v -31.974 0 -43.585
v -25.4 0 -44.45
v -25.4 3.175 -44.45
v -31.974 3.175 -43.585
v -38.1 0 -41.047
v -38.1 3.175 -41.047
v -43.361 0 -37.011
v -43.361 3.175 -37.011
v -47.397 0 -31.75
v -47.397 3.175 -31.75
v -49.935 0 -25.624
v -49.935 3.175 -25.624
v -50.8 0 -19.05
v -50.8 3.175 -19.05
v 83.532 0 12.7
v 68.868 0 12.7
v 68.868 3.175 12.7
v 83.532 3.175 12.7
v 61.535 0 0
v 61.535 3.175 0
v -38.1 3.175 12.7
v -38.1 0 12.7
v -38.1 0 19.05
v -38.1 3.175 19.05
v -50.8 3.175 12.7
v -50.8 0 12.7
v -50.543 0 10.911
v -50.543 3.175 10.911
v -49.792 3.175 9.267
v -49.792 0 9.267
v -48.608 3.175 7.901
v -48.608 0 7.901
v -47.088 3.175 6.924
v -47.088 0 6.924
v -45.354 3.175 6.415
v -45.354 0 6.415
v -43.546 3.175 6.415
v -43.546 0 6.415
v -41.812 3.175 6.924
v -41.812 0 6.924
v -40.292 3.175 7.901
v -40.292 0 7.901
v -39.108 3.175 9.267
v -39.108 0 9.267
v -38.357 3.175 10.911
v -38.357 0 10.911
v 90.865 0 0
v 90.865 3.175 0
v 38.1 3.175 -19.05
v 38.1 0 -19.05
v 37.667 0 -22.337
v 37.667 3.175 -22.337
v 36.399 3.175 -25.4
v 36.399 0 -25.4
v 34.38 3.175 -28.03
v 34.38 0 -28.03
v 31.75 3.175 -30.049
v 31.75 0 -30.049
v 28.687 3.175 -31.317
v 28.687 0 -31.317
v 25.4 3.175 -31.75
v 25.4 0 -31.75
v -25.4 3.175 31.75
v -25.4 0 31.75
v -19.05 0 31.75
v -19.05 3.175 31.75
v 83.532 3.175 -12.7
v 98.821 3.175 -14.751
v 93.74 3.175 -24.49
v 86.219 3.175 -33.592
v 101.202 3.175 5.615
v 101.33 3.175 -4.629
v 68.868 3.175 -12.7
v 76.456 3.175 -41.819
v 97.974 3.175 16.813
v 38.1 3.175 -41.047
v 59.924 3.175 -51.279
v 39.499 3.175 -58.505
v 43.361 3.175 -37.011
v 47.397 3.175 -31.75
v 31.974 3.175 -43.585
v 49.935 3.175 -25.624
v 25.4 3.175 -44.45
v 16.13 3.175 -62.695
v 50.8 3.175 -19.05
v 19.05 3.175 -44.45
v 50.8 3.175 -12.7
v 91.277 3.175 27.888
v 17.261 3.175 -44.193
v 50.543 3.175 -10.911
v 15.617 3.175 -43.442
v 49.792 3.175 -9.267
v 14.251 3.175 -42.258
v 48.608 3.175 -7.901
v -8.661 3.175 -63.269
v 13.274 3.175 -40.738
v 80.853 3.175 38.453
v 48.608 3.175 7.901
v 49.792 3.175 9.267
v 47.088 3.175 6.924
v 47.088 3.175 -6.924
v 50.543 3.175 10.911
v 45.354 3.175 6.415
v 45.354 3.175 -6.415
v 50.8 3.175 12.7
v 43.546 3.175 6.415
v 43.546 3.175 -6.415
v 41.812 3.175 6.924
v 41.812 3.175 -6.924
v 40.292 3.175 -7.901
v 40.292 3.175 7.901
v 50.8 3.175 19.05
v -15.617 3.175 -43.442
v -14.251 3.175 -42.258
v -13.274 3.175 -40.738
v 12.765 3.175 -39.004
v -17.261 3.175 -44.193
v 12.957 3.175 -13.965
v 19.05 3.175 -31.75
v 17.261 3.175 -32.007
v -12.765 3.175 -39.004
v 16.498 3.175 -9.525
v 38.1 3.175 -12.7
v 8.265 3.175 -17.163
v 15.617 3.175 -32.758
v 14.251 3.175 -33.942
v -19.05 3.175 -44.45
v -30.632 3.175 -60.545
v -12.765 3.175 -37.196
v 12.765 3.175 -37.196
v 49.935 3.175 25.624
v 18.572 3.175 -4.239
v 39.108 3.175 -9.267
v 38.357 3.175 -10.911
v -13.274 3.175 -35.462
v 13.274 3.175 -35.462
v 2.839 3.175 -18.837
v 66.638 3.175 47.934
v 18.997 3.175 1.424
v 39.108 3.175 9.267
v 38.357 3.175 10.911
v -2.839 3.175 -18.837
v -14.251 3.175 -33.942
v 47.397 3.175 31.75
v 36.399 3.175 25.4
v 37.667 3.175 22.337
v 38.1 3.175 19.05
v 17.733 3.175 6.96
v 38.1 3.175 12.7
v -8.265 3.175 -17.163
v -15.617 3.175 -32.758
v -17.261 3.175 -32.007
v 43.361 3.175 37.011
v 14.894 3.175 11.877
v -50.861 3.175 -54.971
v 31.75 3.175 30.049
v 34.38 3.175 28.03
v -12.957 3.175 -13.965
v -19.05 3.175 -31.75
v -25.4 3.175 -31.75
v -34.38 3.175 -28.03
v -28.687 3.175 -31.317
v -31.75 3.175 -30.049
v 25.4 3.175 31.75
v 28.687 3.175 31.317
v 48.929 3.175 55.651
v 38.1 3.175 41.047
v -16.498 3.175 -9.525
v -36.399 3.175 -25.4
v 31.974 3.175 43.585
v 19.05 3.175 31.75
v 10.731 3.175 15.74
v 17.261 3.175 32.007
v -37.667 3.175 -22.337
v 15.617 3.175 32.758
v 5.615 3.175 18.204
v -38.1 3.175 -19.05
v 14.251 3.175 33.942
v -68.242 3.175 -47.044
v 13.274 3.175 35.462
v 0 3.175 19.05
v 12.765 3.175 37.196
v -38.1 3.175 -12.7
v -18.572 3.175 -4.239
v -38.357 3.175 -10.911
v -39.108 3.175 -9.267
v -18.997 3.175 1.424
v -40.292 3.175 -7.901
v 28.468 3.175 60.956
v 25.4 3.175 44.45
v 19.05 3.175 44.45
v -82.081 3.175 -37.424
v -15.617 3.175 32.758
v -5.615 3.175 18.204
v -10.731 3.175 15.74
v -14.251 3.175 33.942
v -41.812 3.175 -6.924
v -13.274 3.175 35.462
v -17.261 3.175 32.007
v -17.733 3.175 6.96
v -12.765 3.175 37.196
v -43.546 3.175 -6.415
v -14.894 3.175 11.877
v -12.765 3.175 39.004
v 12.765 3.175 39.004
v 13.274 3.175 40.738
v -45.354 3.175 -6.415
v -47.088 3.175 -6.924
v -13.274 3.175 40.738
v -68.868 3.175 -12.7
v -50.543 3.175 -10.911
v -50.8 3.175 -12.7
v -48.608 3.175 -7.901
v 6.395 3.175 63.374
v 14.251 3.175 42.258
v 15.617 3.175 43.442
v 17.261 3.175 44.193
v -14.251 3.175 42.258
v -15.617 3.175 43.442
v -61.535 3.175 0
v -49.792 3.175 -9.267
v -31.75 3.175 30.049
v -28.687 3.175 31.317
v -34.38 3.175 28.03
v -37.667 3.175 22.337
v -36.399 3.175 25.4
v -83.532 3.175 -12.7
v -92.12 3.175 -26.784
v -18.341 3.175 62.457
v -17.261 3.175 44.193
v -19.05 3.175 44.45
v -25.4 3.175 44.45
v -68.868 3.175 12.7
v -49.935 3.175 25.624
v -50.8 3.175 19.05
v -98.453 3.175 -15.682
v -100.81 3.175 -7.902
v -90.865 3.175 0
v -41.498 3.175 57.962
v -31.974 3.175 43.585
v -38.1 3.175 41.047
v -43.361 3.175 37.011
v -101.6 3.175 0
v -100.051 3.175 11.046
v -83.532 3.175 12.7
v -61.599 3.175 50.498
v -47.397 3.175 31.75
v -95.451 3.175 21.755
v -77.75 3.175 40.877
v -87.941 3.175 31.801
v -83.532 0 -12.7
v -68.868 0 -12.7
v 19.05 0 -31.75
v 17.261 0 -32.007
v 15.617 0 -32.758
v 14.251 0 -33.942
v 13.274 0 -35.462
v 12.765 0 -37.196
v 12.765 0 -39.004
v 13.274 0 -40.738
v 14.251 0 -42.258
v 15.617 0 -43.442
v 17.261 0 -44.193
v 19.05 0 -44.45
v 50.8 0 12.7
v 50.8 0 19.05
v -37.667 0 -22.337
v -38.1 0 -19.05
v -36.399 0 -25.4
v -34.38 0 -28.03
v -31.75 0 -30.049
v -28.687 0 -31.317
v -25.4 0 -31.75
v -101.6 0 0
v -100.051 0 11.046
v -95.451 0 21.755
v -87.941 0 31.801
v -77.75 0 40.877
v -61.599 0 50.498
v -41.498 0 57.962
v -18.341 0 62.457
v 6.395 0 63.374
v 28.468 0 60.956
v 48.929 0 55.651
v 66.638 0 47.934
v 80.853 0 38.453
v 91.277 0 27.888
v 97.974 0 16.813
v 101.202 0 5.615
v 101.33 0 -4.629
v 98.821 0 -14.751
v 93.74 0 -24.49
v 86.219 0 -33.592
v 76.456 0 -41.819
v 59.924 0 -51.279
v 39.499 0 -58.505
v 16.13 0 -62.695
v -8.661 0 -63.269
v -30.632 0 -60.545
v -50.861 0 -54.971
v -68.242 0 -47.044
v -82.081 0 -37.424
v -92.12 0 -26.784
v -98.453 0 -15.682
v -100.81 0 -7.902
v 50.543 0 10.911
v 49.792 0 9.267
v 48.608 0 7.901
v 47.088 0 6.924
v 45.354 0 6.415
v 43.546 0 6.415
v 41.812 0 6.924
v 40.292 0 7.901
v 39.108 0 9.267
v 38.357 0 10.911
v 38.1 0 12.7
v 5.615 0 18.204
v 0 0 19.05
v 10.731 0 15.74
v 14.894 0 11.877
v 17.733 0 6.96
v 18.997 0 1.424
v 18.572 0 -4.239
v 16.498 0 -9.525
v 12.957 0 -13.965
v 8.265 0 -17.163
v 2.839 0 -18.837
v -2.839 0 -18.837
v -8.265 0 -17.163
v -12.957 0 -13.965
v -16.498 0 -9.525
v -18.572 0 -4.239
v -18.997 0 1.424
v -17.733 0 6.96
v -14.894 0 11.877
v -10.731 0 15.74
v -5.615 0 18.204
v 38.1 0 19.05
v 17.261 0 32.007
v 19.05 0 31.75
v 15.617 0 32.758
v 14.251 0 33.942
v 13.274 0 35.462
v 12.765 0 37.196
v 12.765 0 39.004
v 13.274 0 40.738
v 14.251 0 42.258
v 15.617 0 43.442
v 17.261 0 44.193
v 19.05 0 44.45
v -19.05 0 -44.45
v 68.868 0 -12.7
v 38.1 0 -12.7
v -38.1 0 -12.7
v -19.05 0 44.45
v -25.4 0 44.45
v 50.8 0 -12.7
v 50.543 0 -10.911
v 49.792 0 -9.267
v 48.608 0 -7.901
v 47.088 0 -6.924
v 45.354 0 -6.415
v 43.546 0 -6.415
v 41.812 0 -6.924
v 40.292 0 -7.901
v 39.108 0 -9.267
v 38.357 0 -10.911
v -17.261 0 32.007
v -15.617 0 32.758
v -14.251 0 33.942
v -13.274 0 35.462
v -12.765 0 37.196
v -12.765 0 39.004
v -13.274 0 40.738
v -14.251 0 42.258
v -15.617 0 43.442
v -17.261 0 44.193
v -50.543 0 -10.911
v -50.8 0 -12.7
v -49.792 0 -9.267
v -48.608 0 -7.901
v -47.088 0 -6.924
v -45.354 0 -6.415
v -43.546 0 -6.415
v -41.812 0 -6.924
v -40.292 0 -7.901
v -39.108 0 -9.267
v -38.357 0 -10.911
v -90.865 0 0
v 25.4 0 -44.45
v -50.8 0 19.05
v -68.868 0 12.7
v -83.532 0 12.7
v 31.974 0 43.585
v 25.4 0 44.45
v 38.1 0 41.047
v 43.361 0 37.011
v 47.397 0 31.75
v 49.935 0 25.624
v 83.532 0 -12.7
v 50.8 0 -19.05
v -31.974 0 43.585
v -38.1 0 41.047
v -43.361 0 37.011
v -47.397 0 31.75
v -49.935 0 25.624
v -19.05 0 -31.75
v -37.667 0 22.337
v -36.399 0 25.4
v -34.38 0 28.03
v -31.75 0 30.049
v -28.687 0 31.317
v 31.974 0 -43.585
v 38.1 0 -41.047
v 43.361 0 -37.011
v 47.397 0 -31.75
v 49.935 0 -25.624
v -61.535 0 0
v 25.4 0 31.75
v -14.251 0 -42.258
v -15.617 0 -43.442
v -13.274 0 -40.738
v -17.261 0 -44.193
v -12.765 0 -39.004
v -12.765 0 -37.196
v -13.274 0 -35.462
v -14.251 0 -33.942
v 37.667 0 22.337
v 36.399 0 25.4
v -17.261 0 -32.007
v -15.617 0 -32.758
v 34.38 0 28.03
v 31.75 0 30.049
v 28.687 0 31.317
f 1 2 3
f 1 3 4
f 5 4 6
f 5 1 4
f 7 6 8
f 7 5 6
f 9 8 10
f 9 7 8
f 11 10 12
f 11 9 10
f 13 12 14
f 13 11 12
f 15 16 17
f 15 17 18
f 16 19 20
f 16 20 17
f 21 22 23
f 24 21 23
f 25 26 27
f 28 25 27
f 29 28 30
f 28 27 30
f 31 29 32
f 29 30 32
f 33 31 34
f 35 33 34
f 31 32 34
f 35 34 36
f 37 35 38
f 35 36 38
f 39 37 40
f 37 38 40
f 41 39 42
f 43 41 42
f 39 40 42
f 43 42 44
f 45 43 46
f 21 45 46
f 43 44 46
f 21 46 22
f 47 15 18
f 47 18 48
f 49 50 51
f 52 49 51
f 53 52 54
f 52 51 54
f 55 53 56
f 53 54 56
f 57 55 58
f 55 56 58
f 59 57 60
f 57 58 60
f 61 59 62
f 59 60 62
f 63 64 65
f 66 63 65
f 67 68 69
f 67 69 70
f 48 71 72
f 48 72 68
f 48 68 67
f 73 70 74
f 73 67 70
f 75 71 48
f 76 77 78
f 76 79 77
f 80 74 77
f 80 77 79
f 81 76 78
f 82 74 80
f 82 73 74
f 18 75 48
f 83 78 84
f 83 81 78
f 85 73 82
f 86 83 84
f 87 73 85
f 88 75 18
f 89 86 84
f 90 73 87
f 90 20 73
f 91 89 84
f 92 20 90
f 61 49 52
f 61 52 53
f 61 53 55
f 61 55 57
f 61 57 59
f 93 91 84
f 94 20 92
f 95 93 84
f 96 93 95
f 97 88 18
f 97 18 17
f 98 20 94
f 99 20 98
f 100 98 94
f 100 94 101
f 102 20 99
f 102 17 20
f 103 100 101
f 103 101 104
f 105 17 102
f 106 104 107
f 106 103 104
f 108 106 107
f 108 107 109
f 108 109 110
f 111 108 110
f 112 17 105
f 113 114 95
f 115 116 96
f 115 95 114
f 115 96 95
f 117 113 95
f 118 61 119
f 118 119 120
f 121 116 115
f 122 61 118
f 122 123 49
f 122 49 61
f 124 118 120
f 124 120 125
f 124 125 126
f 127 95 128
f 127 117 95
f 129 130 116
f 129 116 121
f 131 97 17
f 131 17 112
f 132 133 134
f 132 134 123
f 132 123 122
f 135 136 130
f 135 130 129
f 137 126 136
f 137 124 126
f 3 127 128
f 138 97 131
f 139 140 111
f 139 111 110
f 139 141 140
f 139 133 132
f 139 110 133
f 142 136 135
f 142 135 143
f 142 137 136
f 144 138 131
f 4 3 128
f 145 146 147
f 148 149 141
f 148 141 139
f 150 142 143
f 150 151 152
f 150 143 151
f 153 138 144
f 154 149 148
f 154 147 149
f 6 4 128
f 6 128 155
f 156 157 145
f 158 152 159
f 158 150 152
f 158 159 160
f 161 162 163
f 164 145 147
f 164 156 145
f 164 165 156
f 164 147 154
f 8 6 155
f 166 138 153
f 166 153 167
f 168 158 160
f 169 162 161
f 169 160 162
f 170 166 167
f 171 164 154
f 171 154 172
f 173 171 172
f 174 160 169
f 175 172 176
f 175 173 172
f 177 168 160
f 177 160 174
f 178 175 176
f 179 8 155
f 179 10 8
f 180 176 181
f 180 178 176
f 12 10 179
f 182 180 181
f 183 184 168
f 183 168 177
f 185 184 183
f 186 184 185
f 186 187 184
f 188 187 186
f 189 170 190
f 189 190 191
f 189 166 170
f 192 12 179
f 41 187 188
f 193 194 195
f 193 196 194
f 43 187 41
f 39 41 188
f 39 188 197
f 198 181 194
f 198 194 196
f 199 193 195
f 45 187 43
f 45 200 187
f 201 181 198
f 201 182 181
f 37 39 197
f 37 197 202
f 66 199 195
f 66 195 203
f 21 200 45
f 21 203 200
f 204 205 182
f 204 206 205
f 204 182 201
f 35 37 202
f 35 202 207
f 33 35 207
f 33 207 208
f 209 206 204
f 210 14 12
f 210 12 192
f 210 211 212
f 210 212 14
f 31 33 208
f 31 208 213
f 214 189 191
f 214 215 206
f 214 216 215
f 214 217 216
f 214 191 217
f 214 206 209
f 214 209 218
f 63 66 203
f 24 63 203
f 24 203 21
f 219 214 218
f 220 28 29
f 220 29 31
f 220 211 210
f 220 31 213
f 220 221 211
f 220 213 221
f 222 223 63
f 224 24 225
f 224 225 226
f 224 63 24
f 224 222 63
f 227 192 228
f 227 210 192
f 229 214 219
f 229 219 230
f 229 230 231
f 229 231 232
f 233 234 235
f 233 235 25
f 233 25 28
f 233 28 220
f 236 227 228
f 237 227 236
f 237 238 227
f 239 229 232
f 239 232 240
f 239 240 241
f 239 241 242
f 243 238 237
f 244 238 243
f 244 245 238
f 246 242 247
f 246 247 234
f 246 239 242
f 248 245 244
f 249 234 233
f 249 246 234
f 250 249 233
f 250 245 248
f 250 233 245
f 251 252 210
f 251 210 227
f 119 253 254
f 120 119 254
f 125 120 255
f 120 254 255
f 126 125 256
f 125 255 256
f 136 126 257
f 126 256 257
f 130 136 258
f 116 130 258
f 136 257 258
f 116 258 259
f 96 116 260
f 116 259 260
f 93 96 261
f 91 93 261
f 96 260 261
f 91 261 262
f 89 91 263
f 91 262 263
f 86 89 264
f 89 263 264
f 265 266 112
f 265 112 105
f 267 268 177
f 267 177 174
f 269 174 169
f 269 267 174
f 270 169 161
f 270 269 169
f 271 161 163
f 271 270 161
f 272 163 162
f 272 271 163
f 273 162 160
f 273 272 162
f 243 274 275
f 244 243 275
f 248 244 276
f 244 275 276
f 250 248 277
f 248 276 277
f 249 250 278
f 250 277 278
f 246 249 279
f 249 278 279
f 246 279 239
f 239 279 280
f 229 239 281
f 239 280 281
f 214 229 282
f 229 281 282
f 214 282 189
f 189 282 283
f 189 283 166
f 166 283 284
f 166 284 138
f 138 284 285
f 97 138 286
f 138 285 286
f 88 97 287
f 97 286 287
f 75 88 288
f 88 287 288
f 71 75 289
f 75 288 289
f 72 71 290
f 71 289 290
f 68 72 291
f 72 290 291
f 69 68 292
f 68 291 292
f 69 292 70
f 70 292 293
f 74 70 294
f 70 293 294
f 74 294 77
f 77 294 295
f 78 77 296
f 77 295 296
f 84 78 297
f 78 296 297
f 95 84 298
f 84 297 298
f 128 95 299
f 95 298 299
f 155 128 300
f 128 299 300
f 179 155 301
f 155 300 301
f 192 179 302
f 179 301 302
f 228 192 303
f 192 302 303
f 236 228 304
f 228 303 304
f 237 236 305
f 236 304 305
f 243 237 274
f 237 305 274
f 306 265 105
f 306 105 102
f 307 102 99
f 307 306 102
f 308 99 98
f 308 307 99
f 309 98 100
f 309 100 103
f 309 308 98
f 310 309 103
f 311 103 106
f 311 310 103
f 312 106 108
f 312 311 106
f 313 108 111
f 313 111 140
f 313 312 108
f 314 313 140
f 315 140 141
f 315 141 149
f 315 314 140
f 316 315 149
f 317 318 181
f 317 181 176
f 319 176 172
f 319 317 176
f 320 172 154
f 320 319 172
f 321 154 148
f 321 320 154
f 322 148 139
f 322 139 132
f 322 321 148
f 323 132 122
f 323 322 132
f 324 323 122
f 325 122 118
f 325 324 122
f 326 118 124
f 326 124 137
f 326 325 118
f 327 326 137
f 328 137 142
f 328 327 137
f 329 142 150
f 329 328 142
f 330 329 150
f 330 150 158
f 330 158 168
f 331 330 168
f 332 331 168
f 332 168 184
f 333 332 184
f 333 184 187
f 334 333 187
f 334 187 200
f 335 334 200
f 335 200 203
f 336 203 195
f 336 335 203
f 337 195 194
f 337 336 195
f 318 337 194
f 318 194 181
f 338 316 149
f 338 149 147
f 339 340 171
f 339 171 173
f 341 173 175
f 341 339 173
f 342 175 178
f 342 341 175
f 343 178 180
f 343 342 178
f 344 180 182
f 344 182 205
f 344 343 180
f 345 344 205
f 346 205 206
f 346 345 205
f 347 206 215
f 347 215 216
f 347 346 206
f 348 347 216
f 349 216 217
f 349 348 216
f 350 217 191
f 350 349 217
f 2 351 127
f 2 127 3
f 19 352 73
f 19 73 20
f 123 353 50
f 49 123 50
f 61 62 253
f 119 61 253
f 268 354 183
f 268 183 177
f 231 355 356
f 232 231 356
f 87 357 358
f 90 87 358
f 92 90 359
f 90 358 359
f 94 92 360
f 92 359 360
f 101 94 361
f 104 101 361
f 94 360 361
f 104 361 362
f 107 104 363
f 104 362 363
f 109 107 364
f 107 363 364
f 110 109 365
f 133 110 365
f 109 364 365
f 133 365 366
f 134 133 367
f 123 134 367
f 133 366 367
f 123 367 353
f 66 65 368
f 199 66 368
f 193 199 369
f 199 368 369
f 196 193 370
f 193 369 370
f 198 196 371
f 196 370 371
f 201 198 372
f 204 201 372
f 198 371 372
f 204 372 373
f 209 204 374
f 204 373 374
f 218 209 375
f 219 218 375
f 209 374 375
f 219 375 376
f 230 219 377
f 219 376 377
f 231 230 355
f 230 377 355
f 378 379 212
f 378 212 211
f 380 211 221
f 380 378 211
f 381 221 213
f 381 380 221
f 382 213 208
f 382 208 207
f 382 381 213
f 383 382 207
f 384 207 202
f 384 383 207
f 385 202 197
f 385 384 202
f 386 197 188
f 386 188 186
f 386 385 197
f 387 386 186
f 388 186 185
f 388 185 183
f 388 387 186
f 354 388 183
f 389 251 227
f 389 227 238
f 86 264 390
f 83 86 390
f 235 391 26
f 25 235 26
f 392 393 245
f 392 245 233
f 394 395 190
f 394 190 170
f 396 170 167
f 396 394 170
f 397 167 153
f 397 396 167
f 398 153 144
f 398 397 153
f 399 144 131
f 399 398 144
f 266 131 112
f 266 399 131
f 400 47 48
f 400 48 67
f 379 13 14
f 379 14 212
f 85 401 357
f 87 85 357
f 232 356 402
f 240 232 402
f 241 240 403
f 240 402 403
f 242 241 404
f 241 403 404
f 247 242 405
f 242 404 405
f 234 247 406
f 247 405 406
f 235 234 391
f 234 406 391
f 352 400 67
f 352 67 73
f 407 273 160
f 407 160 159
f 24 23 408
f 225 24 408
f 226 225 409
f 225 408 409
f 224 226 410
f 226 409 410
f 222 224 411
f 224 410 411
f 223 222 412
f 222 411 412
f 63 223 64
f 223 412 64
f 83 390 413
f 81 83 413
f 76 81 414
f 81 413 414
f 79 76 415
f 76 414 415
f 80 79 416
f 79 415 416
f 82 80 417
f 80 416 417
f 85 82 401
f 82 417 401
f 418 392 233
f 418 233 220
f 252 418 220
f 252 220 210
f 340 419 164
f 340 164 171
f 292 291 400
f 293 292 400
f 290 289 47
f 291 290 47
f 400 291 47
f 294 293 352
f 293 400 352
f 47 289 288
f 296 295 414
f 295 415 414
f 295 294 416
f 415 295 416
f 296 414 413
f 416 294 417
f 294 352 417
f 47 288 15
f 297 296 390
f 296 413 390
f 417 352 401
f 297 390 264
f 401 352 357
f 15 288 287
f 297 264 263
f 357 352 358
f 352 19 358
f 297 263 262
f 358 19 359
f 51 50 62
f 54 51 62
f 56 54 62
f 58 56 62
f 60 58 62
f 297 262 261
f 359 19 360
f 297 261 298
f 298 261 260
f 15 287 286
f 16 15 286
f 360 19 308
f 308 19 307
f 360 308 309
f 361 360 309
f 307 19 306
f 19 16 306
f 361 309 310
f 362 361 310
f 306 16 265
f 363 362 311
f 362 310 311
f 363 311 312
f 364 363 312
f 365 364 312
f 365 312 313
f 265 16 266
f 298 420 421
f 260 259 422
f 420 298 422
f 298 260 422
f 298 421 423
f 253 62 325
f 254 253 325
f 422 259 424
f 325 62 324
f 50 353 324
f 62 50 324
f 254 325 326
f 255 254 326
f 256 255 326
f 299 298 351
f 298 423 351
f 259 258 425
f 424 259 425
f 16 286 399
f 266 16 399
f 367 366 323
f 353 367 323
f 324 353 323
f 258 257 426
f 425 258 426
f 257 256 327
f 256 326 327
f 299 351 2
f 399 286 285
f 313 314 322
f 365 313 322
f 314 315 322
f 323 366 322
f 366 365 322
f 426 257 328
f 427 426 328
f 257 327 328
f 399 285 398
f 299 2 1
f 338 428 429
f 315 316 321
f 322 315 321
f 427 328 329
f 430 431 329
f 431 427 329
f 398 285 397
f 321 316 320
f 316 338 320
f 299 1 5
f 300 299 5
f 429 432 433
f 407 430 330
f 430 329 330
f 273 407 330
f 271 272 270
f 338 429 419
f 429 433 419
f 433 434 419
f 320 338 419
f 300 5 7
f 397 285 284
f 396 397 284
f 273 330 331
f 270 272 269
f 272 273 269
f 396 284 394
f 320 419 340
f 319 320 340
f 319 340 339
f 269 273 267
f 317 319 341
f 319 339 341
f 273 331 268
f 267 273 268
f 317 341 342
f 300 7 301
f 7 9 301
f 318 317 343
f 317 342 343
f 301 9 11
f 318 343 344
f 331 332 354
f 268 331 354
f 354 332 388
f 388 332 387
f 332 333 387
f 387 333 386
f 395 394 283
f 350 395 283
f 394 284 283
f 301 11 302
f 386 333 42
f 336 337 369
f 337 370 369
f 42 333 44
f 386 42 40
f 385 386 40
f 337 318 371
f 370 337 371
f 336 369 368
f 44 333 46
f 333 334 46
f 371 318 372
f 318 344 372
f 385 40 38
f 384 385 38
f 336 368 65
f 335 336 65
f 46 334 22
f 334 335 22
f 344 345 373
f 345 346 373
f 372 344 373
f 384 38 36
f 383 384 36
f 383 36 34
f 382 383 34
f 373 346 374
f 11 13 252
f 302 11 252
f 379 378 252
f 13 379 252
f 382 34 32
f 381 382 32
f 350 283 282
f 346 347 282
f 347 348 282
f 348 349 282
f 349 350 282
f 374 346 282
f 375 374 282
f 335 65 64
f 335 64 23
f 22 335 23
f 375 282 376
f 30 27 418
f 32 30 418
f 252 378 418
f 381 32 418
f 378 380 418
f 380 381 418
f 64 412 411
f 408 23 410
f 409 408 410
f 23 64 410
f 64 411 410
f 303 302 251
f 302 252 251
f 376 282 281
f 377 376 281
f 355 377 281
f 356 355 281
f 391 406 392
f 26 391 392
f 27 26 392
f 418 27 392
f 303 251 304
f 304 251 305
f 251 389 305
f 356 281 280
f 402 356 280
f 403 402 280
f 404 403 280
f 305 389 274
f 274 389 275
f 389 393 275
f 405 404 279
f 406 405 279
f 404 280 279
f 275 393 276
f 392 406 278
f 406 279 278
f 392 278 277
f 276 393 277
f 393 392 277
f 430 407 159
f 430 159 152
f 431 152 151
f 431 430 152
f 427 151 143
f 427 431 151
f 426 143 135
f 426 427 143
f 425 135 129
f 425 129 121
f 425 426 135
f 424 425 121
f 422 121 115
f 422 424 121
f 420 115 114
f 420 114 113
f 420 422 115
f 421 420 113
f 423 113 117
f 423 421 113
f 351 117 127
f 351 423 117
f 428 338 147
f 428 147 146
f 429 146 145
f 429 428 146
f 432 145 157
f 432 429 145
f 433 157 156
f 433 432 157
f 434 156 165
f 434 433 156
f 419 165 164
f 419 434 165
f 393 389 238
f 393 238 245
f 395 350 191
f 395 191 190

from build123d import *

# Parameters (mm, degrees)
SKETCH1_RX          = 101.6
SKETCH1_RY          = 63.5
SKETCH1_R           = 19.05
BOSS_EXTRUDE1_DEPTH = 3.175


with BuildPart() as part:
    # Sketch1 → Boss-Extrude1 (new body)
    with BuildSketch(Plane(origin=(0, 0, 0), x_dir=(1, 0, 0), z_dir=(0, 1, 0))):
        with Locations(Location((0, 0), (0, 0, 180))):
            Ellipse(SKETCH1_RX, SKETCH1_RY)
        with Locations(Location((0, 0, 0), (0, 0, 270))):
            Circle(SKETCH1_R, mode=Mode.SUBTRACT)
        Polygon((-61.535303163, 0), (-68.867651581, 12.7), (-83.532348419, 12.7), (-90.864696837, 0), (-83.532348419, -12.7), (-68.867651581, -12.7), align=None, mode=Mode.SUBTRACT)
        Polygon((90.864696837, 0), (83.532348419, 12.7), (68.867651581, 12.7), (61.535303163, 0), (68.867651581, -12.7), (83.532348419, -12.7), align=None, mode=Mode.SUBTRACT)
        with BuildLine():
            Line((50.8, -19.05), (50.8, -12.7))
            ThreePointArc((50.8, -12.7), (44.45, -6.35), (38.1, -12.7))
            Line((38.1, -12.7), (38.1, -19.05))
            ThreePointArc((38.1, -19.05), (34.380256121, -28.030256121), (25.4, -31.75))
            Line((25.4, -31.75), (19.05, -31.75))
            ThreePointArc((19.05, -31.75), (12.7, -38.1), (19.05, -44.45))
            Line((19.05, -44.45), (25.4, -44.45))
            ThreePointArc((25.4, -44.45), (43.360512242, -37.010512242), (50.8, -19.05))
        make_face(mode=Mode.SUBTRACT)
        with BuildLine():
            Line((-25.4, -31.75), (-19.05, -31.75))
            ThreePointArc((-19.05, -31.75), (-12.7, -38.1), (-19.05, -44.45))
            Line((-19.05, -44.45), (-25.4, -44.45))
            ThreePointArc((-25.4, -44.45), (-43.360512242, -37.010512242), (-50.8, -19.05))
            Line((-50.8, -19.05), (-50.8, -12.7))
            ThreePointArc((-50.8, -12.7), (-44.45, -6.35), (-38.1, -12.7))
            Line((-38.1, -12.7), (-38.1, -19.05))
            ThreePointArc((-38.1, -19.05), (-34.380256121, -28.030256121), (-25.4, -31.75))
        make_face(mode=Mode.SUBTRACT)
        with BuildLine():
            Line((25.4, 31.75), (19.05, 31.75))
            ThreePointArc((19.05, 31.75), (12.7, 38.1), (19.05, 44.45))
            Line((19.05, 44.45), (25.4, 44.45))
            ThreePointArc((25.4, 44.45), (43.360512242, 37.010512242), (50.8, 19.05))
            Line((50.8, 19.05), (50.8, 12.7))
            ThreePointArc((50.8, 12.7), (44.45, 6.35), (38.1, 12.7))
            Line((38.1, 12.7), (38.1, 19.05))
            ThreePointArc((38.1, 19.05), (34.380256121, 28.030256121), (25.4, 31.75))
        make_face(mode=Mode.SUBTRACT)
        with BuildLine():
            Line((-25.4, 31.75), (-19.05, 31.75))
            ThreePointArc((-19.05, 31.75), (-12.7, 38.1), (-19.05, 44.45))
            Line((-19.05, 44.45), (-25.4, 44.45))
            ThreePointArc((-25.4, 44.45), (-43.360512242, 37.010512242), (-50.8, 19.05))
            Line((-50.8, 19.05), (-50.8, 12.7))
            ThreePointArc((-50.8, 12.7), (-44.45, 6.35), (-38.1, 12.7))
            Line((-38.1, 12.7), (-38.1, 19.05))
            ThreePointArc((-38.1, 19.05), (-34.380256121, 28.030256121), (-25.4, 31.75))
        make_face(mode=Mode.SUBTRACT)
    extrude(amount=BOSS_EXTRUDE1_DEPTH)


solid = part.part
